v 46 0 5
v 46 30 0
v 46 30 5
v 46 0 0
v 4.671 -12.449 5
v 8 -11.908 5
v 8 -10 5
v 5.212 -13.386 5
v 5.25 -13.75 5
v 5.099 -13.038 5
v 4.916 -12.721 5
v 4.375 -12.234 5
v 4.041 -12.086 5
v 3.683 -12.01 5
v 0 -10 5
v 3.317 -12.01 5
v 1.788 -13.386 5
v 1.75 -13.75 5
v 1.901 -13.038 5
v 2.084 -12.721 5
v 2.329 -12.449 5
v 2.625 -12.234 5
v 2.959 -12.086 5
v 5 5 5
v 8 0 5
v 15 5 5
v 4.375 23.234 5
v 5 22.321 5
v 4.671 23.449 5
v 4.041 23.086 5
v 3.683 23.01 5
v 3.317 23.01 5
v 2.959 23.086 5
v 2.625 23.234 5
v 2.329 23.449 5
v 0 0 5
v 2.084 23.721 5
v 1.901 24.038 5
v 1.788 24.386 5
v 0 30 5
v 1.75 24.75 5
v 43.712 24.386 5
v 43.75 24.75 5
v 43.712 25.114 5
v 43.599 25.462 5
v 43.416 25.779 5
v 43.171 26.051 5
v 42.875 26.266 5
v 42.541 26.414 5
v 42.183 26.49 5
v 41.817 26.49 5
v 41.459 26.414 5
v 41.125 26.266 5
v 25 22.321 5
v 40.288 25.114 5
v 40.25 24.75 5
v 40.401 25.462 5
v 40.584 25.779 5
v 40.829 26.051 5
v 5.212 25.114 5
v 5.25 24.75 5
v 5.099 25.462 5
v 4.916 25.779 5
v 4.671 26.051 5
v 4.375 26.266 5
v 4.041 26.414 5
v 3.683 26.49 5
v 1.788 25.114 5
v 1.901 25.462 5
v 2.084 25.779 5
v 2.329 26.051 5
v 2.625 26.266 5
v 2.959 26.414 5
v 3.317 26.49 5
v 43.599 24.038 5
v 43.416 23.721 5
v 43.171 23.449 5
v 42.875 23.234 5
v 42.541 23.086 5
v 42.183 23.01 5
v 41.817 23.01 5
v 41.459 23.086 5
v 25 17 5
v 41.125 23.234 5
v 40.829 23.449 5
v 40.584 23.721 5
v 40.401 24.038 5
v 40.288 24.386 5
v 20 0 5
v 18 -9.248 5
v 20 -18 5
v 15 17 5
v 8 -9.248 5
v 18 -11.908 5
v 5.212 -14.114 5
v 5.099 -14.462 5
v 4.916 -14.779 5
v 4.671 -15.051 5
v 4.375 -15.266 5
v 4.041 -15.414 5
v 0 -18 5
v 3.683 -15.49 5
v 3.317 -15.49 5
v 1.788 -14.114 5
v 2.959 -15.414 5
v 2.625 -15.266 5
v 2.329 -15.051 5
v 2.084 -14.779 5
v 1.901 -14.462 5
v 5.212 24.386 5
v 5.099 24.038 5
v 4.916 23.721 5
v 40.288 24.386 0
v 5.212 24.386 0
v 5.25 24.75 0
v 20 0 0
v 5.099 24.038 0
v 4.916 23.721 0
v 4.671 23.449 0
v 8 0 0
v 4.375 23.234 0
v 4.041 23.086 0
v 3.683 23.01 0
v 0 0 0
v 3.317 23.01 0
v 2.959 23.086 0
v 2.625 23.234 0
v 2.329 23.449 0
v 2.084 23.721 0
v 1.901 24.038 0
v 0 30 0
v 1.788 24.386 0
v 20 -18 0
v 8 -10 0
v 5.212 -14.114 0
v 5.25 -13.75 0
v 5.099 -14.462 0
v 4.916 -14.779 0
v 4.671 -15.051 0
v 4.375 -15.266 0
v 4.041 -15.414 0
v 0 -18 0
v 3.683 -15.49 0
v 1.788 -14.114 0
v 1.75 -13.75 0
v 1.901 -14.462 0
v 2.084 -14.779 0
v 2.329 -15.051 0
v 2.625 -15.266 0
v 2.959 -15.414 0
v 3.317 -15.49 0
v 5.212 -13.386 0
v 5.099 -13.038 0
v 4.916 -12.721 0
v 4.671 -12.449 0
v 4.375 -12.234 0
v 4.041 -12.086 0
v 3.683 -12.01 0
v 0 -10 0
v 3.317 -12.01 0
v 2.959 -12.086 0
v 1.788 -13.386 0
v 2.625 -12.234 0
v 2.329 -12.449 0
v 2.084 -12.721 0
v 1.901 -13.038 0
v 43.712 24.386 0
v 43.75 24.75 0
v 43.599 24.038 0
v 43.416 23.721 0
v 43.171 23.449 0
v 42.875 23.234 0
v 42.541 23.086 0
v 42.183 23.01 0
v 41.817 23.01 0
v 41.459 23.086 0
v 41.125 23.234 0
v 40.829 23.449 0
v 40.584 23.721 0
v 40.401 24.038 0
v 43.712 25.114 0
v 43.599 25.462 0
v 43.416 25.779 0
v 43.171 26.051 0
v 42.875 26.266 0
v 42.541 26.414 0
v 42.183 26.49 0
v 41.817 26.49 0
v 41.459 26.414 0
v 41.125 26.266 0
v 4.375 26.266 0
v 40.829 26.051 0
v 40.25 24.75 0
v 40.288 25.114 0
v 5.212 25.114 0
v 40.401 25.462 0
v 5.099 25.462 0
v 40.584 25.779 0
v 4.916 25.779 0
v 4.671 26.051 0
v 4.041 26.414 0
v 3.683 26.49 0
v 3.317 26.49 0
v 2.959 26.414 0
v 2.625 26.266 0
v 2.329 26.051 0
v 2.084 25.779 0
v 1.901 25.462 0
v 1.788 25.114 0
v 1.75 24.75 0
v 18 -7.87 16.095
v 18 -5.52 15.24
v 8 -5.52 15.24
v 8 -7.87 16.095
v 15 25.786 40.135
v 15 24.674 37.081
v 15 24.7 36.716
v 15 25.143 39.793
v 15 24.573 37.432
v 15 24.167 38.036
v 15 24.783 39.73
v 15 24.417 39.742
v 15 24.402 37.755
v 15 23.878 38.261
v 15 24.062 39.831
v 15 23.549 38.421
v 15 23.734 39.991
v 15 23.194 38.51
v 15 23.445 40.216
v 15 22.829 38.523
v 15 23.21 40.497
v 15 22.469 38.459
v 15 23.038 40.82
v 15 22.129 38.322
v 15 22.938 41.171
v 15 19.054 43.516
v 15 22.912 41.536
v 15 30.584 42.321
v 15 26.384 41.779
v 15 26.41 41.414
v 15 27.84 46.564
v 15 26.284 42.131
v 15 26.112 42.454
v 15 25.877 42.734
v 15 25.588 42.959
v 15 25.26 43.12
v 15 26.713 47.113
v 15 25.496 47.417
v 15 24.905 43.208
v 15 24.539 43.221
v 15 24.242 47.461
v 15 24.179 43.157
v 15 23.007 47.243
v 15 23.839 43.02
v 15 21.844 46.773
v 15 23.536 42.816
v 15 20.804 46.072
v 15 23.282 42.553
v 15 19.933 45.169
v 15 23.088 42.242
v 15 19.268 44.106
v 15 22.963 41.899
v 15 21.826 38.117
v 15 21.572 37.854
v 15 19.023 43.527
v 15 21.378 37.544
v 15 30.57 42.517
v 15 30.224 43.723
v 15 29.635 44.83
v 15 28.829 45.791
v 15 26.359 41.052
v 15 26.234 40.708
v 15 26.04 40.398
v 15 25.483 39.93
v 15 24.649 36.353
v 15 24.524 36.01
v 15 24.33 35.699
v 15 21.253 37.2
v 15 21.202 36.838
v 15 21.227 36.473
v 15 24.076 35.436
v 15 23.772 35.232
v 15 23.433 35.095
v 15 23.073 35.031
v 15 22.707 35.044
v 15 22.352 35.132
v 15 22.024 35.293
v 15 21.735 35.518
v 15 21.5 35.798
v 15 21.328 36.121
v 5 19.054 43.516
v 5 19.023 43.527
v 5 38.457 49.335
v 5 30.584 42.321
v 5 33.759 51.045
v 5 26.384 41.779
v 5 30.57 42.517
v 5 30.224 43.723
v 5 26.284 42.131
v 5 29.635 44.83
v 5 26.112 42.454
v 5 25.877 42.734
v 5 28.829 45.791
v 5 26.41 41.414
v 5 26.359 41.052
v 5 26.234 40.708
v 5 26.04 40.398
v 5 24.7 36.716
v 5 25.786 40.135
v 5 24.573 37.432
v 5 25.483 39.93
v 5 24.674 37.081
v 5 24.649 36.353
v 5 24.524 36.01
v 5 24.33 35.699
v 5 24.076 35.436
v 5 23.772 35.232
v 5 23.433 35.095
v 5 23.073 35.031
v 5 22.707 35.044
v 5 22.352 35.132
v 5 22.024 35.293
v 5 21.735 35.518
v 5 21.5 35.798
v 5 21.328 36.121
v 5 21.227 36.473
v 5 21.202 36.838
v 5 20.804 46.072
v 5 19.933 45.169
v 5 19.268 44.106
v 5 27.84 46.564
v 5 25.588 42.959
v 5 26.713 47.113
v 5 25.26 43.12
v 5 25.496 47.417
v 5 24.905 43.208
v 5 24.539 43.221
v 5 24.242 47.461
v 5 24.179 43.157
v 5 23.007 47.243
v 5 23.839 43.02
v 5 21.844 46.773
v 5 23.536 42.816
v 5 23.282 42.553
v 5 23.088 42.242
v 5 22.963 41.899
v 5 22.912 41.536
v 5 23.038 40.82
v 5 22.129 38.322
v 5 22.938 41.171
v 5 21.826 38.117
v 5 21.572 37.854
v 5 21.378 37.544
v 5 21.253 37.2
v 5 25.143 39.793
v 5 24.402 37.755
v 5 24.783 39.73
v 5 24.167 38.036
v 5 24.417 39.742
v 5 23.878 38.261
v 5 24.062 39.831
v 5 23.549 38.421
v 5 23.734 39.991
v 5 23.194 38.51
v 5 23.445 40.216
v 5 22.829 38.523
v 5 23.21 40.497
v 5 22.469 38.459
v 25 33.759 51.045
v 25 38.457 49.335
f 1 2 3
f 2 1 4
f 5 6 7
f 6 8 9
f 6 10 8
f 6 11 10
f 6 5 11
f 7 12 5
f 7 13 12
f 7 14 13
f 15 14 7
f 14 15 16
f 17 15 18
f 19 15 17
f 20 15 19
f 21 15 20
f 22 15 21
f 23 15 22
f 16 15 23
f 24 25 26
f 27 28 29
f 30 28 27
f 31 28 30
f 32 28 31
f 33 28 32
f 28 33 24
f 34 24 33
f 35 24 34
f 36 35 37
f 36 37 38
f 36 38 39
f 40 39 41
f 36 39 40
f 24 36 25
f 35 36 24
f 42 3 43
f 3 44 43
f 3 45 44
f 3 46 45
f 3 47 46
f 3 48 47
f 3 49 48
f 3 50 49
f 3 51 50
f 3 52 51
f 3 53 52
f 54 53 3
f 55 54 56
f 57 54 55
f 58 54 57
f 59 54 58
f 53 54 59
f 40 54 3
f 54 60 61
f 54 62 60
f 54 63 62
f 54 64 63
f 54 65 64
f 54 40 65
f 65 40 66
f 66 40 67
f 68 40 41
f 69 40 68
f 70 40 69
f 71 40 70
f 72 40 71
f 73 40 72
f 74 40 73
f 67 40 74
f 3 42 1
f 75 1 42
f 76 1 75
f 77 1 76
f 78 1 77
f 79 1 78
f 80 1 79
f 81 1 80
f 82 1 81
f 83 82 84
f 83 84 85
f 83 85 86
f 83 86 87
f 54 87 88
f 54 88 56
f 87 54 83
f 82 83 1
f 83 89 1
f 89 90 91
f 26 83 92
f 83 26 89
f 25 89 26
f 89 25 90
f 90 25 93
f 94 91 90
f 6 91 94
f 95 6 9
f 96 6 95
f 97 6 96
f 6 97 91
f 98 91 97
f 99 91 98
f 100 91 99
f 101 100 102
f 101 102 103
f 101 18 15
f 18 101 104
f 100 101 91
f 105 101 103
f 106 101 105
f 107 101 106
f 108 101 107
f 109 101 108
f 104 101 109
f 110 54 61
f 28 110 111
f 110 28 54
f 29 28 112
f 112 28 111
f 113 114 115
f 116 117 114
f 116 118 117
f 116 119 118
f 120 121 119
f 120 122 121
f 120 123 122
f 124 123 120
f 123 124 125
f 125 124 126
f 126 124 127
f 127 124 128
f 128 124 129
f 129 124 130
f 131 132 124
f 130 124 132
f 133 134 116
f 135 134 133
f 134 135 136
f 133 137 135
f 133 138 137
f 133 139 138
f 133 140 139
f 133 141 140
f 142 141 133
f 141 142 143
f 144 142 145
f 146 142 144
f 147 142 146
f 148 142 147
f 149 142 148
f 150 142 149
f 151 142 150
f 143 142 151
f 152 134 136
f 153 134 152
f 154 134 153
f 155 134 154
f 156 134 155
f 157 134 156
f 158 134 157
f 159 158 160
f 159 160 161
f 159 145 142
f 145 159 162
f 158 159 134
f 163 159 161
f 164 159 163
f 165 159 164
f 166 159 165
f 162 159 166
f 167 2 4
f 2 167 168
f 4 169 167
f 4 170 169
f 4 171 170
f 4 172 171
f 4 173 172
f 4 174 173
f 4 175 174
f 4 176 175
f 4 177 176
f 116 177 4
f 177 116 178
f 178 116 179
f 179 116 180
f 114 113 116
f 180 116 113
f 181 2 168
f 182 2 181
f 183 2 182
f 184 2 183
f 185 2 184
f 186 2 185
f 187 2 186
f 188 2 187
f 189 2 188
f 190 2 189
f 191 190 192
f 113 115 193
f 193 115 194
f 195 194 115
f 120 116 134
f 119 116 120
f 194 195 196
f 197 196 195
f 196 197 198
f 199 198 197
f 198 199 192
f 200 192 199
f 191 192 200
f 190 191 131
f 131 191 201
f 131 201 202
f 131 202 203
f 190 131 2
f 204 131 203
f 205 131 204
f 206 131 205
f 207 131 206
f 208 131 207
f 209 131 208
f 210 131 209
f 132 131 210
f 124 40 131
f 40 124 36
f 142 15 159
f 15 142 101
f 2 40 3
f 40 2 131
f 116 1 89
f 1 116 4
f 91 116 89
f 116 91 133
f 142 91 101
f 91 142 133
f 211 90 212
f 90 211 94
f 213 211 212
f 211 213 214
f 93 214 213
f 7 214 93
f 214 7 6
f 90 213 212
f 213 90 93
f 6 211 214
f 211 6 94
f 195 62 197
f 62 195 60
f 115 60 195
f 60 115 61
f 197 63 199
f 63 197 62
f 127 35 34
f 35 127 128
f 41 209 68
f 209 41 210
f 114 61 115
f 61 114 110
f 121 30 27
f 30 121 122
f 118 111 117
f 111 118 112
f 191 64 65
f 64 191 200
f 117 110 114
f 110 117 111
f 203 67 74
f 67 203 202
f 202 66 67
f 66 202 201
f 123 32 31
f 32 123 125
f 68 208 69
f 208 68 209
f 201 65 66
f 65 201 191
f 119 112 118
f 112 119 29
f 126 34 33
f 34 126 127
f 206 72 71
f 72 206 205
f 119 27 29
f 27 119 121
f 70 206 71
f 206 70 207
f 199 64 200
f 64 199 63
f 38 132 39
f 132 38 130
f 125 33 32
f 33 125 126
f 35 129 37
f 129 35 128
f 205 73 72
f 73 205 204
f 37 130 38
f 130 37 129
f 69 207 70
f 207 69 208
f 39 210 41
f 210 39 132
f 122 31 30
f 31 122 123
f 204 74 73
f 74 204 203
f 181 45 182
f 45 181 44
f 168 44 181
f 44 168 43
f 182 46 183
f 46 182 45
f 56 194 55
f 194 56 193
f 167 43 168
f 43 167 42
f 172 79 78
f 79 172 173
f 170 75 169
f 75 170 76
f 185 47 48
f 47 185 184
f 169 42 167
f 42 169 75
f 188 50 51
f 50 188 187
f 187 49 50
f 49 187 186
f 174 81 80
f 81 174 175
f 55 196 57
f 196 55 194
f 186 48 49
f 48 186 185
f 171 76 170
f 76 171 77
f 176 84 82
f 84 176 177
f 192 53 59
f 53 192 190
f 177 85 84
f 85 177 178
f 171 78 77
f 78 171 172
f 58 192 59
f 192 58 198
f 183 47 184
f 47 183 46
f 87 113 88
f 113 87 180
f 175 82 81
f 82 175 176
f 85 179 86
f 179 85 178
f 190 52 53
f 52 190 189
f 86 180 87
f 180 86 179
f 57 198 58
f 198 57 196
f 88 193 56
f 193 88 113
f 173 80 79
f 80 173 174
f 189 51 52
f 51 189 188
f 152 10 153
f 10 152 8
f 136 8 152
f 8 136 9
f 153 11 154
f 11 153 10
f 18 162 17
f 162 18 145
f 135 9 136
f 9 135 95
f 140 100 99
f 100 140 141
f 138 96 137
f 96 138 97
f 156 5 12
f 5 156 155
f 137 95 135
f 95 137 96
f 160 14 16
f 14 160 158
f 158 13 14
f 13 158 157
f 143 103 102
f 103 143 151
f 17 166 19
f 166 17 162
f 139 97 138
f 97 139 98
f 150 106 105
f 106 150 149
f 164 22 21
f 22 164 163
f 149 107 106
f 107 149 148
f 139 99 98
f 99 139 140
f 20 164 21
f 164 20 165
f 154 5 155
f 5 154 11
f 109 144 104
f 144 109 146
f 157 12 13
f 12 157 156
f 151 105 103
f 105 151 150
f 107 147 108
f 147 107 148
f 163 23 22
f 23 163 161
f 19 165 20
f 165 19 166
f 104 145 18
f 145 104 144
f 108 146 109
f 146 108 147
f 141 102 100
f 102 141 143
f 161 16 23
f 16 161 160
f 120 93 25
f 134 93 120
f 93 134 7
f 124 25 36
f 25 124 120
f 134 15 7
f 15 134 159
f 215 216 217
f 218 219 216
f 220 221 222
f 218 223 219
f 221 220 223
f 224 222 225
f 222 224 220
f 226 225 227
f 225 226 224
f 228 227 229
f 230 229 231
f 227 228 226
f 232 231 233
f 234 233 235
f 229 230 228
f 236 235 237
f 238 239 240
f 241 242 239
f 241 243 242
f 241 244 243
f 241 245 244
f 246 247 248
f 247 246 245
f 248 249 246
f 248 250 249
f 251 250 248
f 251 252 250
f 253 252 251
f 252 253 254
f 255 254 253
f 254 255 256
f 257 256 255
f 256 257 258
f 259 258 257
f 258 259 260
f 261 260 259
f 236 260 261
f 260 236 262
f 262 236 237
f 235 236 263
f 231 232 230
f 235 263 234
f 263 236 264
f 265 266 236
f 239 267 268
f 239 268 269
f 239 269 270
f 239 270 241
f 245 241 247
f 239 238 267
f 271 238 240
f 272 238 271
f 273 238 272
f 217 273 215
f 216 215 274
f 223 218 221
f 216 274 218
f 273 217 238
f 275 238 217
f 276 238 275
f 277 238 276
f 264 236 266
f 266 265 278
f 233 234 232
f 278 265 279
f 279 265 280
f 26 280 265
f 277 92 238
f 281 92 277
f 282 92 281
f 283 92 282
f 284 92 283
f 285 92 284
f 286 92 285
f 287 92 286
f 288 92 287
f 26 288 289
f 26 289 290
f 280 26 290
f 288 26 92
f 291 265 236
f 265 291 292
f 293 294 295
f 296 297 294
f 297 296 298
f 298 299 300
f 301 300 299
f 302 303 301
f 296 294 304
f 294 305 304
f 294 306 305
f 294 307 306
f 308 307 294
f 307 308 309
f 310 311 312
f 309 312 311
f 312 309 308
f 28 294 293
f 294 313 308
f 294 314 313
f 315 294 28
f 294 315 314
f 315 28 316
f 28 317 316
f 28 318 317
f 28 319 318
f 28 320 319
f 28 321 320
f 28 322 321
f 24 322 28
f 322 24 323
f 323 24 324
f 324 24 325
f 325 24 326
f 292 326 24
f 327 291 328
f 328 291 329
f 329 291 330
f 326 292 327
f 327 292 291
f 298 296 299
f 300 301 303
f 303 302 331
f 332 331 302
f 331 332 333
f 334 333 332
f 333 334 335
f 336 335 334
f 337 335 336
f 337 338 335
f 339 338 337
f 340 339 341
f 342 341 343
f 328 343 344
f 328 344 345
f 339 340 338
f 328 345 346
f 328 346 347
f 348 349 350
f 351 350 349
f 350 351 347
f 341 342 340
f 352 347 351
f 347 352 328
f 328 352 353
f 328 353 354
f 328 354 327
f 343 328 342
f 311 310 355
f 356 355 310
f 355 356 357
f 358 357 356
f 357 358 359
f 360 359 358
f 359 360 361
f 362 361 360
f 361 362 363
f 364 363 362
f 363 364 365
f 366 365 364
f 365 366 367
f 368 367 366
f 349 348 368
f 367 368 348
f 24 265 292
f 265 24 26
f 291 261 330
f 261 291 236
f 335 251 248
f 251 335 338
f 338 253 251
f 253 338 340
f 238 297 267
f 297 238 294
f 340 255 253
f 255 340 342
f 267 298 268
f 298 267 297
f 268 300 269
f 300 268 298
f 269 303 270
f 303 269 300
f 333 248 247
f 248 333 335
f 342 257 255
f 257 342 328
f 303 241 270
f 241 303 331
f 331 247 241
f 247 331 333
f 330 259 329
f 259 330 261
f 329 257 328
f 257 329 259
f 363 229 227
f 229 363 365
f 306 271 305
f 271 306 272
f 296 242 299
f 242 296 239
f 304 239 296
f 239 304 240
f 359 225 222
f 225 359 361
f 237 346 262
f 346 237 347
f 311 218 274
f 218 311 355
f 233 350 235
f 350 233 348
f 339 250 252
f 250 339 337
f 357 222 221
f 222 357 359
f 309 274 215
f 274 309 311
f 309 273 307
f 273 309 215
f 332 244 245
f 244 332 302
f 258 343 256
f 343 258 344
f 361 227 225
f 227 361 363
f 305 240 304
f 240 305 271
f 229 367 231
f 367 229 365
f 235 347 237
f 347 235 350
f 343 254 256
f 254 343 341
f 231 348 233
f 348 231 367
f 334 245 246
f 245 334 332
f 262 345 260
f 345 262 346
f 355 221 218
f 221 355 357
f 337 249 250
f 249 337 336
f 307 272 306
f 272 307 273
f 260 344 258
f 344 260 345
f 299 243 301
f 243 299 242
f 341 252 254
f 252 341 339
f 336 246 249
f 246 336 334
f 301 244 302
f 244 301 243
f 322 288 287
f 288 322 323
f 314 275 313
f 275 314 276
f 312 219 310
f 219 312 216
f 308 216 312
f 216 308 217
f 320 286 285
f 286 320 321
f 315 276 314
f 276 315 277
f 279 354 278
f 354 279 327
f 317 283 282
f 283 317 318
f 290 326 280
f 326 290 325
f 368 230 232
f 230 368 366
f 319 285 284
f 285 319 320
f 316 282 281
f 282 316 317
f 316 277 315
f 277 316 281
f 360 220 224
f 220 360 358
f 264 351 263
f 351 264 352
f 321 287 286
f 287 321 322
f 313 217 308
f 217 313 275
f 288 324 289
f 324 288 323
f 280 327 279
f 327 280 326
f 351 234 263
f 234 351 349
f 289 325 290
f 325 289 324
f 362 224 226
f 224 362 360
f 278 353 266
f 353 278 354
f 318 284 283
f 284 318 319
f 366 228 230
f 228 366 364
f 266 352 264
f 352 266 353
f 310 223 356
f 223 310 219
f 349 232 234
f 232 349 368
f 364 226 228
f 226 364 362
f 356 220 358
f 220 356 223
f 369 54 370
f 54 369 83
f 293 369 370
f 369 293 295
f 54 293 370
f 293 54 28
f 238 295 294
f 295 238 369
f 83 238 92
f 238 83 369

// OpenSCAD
// Cooling Fan Bracket
$fs = 0.2;		// Circle edges 


fan_length = 46;
fan_width = 30;
// fan_width = 30;


wall_thickness = 5;
pillar_width=12.0;
pillar_length=10.0;
pillar_height=41.0;

fan_dist = 38.5;  // gap between fan mount posts
pillar_distx = 5; // distance from left side to pillar left side
pillar_disty = 5; // distance from front side to pillar front side


m4_bolt = 2.2;
m3_bolt = 1.75;
m25_bolt = 1.2;


difference()
	{
	union()
		{
		cube(size=[fan_length, fan_width, wall_thickness] );
	
		translate(v=[0,-18,0] )
			cube(size=[20,30, wall_thickness]);

		// Cable guide
		translate(v=[8,-13,2] )
			rotate(a=[-20,0,0])
				cube(size=[10, wall_thickness/2, 15]);
		
		}

	translate(v=[m3_bolt * 2, fan_width - m3_bolt * 3, 0 ] )
		cylinder(r=m3_bolt, h=wall_thickness );
	translate(v=[m3_bolt * 2 + fan_dist, fan_width - m3_bolt * 3, 0 ] )
		cylinder(r=m3_bolt, h=wall_thickness );

	translate(v=[m3_bolt * 2, fan_width - m3_bolt * 3 - fan_dist, 0 ] )
		cylinder(r=m3_bolt, h=wall_thickness );

	translate(v=[0,-10,0] )
			cube(size=[8,10, wall_thickness]);

	}



translate(v=[pillar_distx, pillar_disty,5 ] )
	rotate(a=[-20, 0,0 ] )
		bracket();

translate(v=[pillar_distx, pillar_disty + pillar_width,5 ] )
	rotate(a=[-20, 0,0 ] )
		cube(size=[20, 5, pillar_height+8] );




module bracket()
	{
	difference()
		{
		union()
			{
			cube( size=[pillar_length, pillar_width, pillar_height] );
	
			translate(v=[0, pillar_width/2, pillar_height] )
				rotate( a=[0,90,0] )
					cylinder(r=pillar_width/2, h=pillar_length);
			}
			translate(v=[-0.5, pillar_width/2, pillar_height] )
				rotate( a=[0,90,0] )
					cylinder(r=m3_bolt, h=pillar_length+1);

			translate(v=[-0.5, pillar_width/2, pillar_height-5] )
				rotate( a=[0,90,0] )
					cylinder(r=m3_bolt, h=pillar_length+1);

		}
}
